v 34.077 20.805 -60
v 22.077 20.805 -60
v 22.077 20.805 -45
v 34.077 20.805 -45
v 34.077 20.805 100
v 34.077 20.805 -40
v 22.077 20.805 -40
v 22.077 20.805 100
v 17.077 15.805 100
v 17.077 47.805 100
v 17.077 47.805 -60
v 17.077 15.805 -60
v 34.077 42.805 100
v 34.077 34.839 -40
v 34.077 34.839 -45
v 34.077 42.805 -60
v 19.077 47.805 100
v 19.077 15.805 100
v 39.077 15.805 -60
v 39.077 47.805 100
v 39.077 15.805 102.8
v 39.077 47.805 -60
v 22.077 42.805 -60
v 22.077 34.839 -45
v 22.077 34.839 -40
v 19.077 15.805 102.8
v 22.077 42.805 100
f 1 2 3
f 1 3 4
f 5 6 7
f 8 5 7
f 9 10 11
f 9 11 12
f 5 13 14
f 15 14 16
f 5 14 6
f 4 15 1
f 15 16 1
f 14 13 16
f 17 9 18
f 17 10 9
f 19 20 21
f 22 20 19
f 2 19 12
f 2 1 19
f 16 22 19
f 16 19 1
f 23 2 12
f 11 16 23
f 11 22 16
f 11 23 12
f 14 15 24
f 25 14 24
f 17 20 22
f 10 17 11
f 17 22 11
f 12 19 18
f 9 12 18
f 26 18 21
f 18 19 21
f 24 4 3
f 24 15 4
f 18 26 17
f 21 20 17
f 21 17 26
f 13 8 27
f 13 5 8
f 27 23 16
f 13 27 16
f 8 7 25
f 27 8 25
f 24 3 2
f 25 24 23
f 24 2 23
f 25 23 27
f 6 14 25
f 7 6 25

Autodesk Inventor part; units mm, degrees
ref_plane "YZ Plane" through (0, 0, 0) normal (1, 0, 0) x (0, 1, 0)
ref_plane "XZ Plane" through (0, 0, 0) normal (0, 1, 0) x (-1, 0, 0)
ref_plane "XY Plane" through (0, 0, 0) normal (0, 0, 1) x (1, 0, 0)
sketch "Sketch1" plane through (0, 0, 0) normal (0, 0, 1) x (1, 0, 0)
  line L0 (22.0768, 42.8051) -> (34.0768, 42.8051)
  line L1 (34.0768, 42.8051) -> (34.0768, 20.8051)
  line L2 (34.0768, 20.8051) -> (22.0768, 20.8051)
  line L3 (22.0768, 20.8051) -> (22.0768, 42.8051)
  line L4 (39.0768, 47.8051) -> (17.0768, 47.8051)
  line L5 (17.0768, 47.8051) -> (17.0768, 15.8051)
  line L6 (17.0768, 15.8051) -> (39.0768, 15.8051)
  line L7 (39.0768, 15.8051) -> (39.0768, 47.8051)
  line L8 (34.0768, 20.8051) -> (34.0768, 15.8051)
  line L9 (22.0768, 20.8051) -> (22.0768, 15.8051)
  line L10 (22.0768, 42.8051) -> (22.0768, 47.8051)
  line L11 (34.0768, 42.8051) -> (34.0768, 47.8051)
  point P0 (0, 0)
  dimension "d4" = 12
  dimension "d5" = 22
  dimension "d6" = 5
extrude "Extrusion2" add sketch "Sketch1" along normal blind 100 and the other way blind 60 contours L10 L4 L11 L0 | L3 L9 L6 L5 L4 L10 | L11 L4 L7 L6 L8 L1 | L2 L8 L6 L9
sketch "Sketch2" plane through (39.0768, 15.8051, 100) normal (1, 0, 0) x (0, 0, -1)
  line L0 (0, 0) -> (0, 32) projected
  line L1 (0, 0) -> (30.1146, 0) construction
  line L2 (0, 32) -> (-2.7996, 0)
  line L3 (0, 32) -> (32.6362, 32) construction
  line L4 (0, 0) -> (-2.7996, 0)
  point P0 (100, -15.8051)
  dimension "d16" = 95
extrude "Extrusion3" add sketch "Sketch2" against normal blind 20
sketch "Sketch3" plane through (0, 0, -60) normal (0, 0, -1) x (-1, 0, 0)
  line L0 (-17.0768, 15.8051) -> (-37.0768, 15.8051)
  line L1 (-37.0768, 15.8051) -> (-37.0768, 36.9275)
  line L2 (-37.0768, 36.9275) -> (-17.0768, 36.9275)
  line L3 (-17.0768, 36.9275) -> (-17.0768, 15.8051)
  line L4 (-22.0768, 20.8051) -> (-34.0768, 20.8051)
  line L5 (-34.0768, 20.8051) -> (-34.0768, 34.8394)
  line L6 (-34.0768, 34.8394) -> (-22.0768, 34.8394)
  line L7 (-22.0768, 34.8394) -> (-22.0768, 20.8051)
  point P0 (0, 0)
  dimension "d17" = 20
  dimension "d18" = 12
extrude "Extrusion4" add sketch "Sketch3" against normal blind 20 contours L4 L5 L6 L7
extrude "Extrusion5" cut sketch "Sketch3" against normal blind 15 contours L4 L5 L6 L7
properties part number "motorstand2"
